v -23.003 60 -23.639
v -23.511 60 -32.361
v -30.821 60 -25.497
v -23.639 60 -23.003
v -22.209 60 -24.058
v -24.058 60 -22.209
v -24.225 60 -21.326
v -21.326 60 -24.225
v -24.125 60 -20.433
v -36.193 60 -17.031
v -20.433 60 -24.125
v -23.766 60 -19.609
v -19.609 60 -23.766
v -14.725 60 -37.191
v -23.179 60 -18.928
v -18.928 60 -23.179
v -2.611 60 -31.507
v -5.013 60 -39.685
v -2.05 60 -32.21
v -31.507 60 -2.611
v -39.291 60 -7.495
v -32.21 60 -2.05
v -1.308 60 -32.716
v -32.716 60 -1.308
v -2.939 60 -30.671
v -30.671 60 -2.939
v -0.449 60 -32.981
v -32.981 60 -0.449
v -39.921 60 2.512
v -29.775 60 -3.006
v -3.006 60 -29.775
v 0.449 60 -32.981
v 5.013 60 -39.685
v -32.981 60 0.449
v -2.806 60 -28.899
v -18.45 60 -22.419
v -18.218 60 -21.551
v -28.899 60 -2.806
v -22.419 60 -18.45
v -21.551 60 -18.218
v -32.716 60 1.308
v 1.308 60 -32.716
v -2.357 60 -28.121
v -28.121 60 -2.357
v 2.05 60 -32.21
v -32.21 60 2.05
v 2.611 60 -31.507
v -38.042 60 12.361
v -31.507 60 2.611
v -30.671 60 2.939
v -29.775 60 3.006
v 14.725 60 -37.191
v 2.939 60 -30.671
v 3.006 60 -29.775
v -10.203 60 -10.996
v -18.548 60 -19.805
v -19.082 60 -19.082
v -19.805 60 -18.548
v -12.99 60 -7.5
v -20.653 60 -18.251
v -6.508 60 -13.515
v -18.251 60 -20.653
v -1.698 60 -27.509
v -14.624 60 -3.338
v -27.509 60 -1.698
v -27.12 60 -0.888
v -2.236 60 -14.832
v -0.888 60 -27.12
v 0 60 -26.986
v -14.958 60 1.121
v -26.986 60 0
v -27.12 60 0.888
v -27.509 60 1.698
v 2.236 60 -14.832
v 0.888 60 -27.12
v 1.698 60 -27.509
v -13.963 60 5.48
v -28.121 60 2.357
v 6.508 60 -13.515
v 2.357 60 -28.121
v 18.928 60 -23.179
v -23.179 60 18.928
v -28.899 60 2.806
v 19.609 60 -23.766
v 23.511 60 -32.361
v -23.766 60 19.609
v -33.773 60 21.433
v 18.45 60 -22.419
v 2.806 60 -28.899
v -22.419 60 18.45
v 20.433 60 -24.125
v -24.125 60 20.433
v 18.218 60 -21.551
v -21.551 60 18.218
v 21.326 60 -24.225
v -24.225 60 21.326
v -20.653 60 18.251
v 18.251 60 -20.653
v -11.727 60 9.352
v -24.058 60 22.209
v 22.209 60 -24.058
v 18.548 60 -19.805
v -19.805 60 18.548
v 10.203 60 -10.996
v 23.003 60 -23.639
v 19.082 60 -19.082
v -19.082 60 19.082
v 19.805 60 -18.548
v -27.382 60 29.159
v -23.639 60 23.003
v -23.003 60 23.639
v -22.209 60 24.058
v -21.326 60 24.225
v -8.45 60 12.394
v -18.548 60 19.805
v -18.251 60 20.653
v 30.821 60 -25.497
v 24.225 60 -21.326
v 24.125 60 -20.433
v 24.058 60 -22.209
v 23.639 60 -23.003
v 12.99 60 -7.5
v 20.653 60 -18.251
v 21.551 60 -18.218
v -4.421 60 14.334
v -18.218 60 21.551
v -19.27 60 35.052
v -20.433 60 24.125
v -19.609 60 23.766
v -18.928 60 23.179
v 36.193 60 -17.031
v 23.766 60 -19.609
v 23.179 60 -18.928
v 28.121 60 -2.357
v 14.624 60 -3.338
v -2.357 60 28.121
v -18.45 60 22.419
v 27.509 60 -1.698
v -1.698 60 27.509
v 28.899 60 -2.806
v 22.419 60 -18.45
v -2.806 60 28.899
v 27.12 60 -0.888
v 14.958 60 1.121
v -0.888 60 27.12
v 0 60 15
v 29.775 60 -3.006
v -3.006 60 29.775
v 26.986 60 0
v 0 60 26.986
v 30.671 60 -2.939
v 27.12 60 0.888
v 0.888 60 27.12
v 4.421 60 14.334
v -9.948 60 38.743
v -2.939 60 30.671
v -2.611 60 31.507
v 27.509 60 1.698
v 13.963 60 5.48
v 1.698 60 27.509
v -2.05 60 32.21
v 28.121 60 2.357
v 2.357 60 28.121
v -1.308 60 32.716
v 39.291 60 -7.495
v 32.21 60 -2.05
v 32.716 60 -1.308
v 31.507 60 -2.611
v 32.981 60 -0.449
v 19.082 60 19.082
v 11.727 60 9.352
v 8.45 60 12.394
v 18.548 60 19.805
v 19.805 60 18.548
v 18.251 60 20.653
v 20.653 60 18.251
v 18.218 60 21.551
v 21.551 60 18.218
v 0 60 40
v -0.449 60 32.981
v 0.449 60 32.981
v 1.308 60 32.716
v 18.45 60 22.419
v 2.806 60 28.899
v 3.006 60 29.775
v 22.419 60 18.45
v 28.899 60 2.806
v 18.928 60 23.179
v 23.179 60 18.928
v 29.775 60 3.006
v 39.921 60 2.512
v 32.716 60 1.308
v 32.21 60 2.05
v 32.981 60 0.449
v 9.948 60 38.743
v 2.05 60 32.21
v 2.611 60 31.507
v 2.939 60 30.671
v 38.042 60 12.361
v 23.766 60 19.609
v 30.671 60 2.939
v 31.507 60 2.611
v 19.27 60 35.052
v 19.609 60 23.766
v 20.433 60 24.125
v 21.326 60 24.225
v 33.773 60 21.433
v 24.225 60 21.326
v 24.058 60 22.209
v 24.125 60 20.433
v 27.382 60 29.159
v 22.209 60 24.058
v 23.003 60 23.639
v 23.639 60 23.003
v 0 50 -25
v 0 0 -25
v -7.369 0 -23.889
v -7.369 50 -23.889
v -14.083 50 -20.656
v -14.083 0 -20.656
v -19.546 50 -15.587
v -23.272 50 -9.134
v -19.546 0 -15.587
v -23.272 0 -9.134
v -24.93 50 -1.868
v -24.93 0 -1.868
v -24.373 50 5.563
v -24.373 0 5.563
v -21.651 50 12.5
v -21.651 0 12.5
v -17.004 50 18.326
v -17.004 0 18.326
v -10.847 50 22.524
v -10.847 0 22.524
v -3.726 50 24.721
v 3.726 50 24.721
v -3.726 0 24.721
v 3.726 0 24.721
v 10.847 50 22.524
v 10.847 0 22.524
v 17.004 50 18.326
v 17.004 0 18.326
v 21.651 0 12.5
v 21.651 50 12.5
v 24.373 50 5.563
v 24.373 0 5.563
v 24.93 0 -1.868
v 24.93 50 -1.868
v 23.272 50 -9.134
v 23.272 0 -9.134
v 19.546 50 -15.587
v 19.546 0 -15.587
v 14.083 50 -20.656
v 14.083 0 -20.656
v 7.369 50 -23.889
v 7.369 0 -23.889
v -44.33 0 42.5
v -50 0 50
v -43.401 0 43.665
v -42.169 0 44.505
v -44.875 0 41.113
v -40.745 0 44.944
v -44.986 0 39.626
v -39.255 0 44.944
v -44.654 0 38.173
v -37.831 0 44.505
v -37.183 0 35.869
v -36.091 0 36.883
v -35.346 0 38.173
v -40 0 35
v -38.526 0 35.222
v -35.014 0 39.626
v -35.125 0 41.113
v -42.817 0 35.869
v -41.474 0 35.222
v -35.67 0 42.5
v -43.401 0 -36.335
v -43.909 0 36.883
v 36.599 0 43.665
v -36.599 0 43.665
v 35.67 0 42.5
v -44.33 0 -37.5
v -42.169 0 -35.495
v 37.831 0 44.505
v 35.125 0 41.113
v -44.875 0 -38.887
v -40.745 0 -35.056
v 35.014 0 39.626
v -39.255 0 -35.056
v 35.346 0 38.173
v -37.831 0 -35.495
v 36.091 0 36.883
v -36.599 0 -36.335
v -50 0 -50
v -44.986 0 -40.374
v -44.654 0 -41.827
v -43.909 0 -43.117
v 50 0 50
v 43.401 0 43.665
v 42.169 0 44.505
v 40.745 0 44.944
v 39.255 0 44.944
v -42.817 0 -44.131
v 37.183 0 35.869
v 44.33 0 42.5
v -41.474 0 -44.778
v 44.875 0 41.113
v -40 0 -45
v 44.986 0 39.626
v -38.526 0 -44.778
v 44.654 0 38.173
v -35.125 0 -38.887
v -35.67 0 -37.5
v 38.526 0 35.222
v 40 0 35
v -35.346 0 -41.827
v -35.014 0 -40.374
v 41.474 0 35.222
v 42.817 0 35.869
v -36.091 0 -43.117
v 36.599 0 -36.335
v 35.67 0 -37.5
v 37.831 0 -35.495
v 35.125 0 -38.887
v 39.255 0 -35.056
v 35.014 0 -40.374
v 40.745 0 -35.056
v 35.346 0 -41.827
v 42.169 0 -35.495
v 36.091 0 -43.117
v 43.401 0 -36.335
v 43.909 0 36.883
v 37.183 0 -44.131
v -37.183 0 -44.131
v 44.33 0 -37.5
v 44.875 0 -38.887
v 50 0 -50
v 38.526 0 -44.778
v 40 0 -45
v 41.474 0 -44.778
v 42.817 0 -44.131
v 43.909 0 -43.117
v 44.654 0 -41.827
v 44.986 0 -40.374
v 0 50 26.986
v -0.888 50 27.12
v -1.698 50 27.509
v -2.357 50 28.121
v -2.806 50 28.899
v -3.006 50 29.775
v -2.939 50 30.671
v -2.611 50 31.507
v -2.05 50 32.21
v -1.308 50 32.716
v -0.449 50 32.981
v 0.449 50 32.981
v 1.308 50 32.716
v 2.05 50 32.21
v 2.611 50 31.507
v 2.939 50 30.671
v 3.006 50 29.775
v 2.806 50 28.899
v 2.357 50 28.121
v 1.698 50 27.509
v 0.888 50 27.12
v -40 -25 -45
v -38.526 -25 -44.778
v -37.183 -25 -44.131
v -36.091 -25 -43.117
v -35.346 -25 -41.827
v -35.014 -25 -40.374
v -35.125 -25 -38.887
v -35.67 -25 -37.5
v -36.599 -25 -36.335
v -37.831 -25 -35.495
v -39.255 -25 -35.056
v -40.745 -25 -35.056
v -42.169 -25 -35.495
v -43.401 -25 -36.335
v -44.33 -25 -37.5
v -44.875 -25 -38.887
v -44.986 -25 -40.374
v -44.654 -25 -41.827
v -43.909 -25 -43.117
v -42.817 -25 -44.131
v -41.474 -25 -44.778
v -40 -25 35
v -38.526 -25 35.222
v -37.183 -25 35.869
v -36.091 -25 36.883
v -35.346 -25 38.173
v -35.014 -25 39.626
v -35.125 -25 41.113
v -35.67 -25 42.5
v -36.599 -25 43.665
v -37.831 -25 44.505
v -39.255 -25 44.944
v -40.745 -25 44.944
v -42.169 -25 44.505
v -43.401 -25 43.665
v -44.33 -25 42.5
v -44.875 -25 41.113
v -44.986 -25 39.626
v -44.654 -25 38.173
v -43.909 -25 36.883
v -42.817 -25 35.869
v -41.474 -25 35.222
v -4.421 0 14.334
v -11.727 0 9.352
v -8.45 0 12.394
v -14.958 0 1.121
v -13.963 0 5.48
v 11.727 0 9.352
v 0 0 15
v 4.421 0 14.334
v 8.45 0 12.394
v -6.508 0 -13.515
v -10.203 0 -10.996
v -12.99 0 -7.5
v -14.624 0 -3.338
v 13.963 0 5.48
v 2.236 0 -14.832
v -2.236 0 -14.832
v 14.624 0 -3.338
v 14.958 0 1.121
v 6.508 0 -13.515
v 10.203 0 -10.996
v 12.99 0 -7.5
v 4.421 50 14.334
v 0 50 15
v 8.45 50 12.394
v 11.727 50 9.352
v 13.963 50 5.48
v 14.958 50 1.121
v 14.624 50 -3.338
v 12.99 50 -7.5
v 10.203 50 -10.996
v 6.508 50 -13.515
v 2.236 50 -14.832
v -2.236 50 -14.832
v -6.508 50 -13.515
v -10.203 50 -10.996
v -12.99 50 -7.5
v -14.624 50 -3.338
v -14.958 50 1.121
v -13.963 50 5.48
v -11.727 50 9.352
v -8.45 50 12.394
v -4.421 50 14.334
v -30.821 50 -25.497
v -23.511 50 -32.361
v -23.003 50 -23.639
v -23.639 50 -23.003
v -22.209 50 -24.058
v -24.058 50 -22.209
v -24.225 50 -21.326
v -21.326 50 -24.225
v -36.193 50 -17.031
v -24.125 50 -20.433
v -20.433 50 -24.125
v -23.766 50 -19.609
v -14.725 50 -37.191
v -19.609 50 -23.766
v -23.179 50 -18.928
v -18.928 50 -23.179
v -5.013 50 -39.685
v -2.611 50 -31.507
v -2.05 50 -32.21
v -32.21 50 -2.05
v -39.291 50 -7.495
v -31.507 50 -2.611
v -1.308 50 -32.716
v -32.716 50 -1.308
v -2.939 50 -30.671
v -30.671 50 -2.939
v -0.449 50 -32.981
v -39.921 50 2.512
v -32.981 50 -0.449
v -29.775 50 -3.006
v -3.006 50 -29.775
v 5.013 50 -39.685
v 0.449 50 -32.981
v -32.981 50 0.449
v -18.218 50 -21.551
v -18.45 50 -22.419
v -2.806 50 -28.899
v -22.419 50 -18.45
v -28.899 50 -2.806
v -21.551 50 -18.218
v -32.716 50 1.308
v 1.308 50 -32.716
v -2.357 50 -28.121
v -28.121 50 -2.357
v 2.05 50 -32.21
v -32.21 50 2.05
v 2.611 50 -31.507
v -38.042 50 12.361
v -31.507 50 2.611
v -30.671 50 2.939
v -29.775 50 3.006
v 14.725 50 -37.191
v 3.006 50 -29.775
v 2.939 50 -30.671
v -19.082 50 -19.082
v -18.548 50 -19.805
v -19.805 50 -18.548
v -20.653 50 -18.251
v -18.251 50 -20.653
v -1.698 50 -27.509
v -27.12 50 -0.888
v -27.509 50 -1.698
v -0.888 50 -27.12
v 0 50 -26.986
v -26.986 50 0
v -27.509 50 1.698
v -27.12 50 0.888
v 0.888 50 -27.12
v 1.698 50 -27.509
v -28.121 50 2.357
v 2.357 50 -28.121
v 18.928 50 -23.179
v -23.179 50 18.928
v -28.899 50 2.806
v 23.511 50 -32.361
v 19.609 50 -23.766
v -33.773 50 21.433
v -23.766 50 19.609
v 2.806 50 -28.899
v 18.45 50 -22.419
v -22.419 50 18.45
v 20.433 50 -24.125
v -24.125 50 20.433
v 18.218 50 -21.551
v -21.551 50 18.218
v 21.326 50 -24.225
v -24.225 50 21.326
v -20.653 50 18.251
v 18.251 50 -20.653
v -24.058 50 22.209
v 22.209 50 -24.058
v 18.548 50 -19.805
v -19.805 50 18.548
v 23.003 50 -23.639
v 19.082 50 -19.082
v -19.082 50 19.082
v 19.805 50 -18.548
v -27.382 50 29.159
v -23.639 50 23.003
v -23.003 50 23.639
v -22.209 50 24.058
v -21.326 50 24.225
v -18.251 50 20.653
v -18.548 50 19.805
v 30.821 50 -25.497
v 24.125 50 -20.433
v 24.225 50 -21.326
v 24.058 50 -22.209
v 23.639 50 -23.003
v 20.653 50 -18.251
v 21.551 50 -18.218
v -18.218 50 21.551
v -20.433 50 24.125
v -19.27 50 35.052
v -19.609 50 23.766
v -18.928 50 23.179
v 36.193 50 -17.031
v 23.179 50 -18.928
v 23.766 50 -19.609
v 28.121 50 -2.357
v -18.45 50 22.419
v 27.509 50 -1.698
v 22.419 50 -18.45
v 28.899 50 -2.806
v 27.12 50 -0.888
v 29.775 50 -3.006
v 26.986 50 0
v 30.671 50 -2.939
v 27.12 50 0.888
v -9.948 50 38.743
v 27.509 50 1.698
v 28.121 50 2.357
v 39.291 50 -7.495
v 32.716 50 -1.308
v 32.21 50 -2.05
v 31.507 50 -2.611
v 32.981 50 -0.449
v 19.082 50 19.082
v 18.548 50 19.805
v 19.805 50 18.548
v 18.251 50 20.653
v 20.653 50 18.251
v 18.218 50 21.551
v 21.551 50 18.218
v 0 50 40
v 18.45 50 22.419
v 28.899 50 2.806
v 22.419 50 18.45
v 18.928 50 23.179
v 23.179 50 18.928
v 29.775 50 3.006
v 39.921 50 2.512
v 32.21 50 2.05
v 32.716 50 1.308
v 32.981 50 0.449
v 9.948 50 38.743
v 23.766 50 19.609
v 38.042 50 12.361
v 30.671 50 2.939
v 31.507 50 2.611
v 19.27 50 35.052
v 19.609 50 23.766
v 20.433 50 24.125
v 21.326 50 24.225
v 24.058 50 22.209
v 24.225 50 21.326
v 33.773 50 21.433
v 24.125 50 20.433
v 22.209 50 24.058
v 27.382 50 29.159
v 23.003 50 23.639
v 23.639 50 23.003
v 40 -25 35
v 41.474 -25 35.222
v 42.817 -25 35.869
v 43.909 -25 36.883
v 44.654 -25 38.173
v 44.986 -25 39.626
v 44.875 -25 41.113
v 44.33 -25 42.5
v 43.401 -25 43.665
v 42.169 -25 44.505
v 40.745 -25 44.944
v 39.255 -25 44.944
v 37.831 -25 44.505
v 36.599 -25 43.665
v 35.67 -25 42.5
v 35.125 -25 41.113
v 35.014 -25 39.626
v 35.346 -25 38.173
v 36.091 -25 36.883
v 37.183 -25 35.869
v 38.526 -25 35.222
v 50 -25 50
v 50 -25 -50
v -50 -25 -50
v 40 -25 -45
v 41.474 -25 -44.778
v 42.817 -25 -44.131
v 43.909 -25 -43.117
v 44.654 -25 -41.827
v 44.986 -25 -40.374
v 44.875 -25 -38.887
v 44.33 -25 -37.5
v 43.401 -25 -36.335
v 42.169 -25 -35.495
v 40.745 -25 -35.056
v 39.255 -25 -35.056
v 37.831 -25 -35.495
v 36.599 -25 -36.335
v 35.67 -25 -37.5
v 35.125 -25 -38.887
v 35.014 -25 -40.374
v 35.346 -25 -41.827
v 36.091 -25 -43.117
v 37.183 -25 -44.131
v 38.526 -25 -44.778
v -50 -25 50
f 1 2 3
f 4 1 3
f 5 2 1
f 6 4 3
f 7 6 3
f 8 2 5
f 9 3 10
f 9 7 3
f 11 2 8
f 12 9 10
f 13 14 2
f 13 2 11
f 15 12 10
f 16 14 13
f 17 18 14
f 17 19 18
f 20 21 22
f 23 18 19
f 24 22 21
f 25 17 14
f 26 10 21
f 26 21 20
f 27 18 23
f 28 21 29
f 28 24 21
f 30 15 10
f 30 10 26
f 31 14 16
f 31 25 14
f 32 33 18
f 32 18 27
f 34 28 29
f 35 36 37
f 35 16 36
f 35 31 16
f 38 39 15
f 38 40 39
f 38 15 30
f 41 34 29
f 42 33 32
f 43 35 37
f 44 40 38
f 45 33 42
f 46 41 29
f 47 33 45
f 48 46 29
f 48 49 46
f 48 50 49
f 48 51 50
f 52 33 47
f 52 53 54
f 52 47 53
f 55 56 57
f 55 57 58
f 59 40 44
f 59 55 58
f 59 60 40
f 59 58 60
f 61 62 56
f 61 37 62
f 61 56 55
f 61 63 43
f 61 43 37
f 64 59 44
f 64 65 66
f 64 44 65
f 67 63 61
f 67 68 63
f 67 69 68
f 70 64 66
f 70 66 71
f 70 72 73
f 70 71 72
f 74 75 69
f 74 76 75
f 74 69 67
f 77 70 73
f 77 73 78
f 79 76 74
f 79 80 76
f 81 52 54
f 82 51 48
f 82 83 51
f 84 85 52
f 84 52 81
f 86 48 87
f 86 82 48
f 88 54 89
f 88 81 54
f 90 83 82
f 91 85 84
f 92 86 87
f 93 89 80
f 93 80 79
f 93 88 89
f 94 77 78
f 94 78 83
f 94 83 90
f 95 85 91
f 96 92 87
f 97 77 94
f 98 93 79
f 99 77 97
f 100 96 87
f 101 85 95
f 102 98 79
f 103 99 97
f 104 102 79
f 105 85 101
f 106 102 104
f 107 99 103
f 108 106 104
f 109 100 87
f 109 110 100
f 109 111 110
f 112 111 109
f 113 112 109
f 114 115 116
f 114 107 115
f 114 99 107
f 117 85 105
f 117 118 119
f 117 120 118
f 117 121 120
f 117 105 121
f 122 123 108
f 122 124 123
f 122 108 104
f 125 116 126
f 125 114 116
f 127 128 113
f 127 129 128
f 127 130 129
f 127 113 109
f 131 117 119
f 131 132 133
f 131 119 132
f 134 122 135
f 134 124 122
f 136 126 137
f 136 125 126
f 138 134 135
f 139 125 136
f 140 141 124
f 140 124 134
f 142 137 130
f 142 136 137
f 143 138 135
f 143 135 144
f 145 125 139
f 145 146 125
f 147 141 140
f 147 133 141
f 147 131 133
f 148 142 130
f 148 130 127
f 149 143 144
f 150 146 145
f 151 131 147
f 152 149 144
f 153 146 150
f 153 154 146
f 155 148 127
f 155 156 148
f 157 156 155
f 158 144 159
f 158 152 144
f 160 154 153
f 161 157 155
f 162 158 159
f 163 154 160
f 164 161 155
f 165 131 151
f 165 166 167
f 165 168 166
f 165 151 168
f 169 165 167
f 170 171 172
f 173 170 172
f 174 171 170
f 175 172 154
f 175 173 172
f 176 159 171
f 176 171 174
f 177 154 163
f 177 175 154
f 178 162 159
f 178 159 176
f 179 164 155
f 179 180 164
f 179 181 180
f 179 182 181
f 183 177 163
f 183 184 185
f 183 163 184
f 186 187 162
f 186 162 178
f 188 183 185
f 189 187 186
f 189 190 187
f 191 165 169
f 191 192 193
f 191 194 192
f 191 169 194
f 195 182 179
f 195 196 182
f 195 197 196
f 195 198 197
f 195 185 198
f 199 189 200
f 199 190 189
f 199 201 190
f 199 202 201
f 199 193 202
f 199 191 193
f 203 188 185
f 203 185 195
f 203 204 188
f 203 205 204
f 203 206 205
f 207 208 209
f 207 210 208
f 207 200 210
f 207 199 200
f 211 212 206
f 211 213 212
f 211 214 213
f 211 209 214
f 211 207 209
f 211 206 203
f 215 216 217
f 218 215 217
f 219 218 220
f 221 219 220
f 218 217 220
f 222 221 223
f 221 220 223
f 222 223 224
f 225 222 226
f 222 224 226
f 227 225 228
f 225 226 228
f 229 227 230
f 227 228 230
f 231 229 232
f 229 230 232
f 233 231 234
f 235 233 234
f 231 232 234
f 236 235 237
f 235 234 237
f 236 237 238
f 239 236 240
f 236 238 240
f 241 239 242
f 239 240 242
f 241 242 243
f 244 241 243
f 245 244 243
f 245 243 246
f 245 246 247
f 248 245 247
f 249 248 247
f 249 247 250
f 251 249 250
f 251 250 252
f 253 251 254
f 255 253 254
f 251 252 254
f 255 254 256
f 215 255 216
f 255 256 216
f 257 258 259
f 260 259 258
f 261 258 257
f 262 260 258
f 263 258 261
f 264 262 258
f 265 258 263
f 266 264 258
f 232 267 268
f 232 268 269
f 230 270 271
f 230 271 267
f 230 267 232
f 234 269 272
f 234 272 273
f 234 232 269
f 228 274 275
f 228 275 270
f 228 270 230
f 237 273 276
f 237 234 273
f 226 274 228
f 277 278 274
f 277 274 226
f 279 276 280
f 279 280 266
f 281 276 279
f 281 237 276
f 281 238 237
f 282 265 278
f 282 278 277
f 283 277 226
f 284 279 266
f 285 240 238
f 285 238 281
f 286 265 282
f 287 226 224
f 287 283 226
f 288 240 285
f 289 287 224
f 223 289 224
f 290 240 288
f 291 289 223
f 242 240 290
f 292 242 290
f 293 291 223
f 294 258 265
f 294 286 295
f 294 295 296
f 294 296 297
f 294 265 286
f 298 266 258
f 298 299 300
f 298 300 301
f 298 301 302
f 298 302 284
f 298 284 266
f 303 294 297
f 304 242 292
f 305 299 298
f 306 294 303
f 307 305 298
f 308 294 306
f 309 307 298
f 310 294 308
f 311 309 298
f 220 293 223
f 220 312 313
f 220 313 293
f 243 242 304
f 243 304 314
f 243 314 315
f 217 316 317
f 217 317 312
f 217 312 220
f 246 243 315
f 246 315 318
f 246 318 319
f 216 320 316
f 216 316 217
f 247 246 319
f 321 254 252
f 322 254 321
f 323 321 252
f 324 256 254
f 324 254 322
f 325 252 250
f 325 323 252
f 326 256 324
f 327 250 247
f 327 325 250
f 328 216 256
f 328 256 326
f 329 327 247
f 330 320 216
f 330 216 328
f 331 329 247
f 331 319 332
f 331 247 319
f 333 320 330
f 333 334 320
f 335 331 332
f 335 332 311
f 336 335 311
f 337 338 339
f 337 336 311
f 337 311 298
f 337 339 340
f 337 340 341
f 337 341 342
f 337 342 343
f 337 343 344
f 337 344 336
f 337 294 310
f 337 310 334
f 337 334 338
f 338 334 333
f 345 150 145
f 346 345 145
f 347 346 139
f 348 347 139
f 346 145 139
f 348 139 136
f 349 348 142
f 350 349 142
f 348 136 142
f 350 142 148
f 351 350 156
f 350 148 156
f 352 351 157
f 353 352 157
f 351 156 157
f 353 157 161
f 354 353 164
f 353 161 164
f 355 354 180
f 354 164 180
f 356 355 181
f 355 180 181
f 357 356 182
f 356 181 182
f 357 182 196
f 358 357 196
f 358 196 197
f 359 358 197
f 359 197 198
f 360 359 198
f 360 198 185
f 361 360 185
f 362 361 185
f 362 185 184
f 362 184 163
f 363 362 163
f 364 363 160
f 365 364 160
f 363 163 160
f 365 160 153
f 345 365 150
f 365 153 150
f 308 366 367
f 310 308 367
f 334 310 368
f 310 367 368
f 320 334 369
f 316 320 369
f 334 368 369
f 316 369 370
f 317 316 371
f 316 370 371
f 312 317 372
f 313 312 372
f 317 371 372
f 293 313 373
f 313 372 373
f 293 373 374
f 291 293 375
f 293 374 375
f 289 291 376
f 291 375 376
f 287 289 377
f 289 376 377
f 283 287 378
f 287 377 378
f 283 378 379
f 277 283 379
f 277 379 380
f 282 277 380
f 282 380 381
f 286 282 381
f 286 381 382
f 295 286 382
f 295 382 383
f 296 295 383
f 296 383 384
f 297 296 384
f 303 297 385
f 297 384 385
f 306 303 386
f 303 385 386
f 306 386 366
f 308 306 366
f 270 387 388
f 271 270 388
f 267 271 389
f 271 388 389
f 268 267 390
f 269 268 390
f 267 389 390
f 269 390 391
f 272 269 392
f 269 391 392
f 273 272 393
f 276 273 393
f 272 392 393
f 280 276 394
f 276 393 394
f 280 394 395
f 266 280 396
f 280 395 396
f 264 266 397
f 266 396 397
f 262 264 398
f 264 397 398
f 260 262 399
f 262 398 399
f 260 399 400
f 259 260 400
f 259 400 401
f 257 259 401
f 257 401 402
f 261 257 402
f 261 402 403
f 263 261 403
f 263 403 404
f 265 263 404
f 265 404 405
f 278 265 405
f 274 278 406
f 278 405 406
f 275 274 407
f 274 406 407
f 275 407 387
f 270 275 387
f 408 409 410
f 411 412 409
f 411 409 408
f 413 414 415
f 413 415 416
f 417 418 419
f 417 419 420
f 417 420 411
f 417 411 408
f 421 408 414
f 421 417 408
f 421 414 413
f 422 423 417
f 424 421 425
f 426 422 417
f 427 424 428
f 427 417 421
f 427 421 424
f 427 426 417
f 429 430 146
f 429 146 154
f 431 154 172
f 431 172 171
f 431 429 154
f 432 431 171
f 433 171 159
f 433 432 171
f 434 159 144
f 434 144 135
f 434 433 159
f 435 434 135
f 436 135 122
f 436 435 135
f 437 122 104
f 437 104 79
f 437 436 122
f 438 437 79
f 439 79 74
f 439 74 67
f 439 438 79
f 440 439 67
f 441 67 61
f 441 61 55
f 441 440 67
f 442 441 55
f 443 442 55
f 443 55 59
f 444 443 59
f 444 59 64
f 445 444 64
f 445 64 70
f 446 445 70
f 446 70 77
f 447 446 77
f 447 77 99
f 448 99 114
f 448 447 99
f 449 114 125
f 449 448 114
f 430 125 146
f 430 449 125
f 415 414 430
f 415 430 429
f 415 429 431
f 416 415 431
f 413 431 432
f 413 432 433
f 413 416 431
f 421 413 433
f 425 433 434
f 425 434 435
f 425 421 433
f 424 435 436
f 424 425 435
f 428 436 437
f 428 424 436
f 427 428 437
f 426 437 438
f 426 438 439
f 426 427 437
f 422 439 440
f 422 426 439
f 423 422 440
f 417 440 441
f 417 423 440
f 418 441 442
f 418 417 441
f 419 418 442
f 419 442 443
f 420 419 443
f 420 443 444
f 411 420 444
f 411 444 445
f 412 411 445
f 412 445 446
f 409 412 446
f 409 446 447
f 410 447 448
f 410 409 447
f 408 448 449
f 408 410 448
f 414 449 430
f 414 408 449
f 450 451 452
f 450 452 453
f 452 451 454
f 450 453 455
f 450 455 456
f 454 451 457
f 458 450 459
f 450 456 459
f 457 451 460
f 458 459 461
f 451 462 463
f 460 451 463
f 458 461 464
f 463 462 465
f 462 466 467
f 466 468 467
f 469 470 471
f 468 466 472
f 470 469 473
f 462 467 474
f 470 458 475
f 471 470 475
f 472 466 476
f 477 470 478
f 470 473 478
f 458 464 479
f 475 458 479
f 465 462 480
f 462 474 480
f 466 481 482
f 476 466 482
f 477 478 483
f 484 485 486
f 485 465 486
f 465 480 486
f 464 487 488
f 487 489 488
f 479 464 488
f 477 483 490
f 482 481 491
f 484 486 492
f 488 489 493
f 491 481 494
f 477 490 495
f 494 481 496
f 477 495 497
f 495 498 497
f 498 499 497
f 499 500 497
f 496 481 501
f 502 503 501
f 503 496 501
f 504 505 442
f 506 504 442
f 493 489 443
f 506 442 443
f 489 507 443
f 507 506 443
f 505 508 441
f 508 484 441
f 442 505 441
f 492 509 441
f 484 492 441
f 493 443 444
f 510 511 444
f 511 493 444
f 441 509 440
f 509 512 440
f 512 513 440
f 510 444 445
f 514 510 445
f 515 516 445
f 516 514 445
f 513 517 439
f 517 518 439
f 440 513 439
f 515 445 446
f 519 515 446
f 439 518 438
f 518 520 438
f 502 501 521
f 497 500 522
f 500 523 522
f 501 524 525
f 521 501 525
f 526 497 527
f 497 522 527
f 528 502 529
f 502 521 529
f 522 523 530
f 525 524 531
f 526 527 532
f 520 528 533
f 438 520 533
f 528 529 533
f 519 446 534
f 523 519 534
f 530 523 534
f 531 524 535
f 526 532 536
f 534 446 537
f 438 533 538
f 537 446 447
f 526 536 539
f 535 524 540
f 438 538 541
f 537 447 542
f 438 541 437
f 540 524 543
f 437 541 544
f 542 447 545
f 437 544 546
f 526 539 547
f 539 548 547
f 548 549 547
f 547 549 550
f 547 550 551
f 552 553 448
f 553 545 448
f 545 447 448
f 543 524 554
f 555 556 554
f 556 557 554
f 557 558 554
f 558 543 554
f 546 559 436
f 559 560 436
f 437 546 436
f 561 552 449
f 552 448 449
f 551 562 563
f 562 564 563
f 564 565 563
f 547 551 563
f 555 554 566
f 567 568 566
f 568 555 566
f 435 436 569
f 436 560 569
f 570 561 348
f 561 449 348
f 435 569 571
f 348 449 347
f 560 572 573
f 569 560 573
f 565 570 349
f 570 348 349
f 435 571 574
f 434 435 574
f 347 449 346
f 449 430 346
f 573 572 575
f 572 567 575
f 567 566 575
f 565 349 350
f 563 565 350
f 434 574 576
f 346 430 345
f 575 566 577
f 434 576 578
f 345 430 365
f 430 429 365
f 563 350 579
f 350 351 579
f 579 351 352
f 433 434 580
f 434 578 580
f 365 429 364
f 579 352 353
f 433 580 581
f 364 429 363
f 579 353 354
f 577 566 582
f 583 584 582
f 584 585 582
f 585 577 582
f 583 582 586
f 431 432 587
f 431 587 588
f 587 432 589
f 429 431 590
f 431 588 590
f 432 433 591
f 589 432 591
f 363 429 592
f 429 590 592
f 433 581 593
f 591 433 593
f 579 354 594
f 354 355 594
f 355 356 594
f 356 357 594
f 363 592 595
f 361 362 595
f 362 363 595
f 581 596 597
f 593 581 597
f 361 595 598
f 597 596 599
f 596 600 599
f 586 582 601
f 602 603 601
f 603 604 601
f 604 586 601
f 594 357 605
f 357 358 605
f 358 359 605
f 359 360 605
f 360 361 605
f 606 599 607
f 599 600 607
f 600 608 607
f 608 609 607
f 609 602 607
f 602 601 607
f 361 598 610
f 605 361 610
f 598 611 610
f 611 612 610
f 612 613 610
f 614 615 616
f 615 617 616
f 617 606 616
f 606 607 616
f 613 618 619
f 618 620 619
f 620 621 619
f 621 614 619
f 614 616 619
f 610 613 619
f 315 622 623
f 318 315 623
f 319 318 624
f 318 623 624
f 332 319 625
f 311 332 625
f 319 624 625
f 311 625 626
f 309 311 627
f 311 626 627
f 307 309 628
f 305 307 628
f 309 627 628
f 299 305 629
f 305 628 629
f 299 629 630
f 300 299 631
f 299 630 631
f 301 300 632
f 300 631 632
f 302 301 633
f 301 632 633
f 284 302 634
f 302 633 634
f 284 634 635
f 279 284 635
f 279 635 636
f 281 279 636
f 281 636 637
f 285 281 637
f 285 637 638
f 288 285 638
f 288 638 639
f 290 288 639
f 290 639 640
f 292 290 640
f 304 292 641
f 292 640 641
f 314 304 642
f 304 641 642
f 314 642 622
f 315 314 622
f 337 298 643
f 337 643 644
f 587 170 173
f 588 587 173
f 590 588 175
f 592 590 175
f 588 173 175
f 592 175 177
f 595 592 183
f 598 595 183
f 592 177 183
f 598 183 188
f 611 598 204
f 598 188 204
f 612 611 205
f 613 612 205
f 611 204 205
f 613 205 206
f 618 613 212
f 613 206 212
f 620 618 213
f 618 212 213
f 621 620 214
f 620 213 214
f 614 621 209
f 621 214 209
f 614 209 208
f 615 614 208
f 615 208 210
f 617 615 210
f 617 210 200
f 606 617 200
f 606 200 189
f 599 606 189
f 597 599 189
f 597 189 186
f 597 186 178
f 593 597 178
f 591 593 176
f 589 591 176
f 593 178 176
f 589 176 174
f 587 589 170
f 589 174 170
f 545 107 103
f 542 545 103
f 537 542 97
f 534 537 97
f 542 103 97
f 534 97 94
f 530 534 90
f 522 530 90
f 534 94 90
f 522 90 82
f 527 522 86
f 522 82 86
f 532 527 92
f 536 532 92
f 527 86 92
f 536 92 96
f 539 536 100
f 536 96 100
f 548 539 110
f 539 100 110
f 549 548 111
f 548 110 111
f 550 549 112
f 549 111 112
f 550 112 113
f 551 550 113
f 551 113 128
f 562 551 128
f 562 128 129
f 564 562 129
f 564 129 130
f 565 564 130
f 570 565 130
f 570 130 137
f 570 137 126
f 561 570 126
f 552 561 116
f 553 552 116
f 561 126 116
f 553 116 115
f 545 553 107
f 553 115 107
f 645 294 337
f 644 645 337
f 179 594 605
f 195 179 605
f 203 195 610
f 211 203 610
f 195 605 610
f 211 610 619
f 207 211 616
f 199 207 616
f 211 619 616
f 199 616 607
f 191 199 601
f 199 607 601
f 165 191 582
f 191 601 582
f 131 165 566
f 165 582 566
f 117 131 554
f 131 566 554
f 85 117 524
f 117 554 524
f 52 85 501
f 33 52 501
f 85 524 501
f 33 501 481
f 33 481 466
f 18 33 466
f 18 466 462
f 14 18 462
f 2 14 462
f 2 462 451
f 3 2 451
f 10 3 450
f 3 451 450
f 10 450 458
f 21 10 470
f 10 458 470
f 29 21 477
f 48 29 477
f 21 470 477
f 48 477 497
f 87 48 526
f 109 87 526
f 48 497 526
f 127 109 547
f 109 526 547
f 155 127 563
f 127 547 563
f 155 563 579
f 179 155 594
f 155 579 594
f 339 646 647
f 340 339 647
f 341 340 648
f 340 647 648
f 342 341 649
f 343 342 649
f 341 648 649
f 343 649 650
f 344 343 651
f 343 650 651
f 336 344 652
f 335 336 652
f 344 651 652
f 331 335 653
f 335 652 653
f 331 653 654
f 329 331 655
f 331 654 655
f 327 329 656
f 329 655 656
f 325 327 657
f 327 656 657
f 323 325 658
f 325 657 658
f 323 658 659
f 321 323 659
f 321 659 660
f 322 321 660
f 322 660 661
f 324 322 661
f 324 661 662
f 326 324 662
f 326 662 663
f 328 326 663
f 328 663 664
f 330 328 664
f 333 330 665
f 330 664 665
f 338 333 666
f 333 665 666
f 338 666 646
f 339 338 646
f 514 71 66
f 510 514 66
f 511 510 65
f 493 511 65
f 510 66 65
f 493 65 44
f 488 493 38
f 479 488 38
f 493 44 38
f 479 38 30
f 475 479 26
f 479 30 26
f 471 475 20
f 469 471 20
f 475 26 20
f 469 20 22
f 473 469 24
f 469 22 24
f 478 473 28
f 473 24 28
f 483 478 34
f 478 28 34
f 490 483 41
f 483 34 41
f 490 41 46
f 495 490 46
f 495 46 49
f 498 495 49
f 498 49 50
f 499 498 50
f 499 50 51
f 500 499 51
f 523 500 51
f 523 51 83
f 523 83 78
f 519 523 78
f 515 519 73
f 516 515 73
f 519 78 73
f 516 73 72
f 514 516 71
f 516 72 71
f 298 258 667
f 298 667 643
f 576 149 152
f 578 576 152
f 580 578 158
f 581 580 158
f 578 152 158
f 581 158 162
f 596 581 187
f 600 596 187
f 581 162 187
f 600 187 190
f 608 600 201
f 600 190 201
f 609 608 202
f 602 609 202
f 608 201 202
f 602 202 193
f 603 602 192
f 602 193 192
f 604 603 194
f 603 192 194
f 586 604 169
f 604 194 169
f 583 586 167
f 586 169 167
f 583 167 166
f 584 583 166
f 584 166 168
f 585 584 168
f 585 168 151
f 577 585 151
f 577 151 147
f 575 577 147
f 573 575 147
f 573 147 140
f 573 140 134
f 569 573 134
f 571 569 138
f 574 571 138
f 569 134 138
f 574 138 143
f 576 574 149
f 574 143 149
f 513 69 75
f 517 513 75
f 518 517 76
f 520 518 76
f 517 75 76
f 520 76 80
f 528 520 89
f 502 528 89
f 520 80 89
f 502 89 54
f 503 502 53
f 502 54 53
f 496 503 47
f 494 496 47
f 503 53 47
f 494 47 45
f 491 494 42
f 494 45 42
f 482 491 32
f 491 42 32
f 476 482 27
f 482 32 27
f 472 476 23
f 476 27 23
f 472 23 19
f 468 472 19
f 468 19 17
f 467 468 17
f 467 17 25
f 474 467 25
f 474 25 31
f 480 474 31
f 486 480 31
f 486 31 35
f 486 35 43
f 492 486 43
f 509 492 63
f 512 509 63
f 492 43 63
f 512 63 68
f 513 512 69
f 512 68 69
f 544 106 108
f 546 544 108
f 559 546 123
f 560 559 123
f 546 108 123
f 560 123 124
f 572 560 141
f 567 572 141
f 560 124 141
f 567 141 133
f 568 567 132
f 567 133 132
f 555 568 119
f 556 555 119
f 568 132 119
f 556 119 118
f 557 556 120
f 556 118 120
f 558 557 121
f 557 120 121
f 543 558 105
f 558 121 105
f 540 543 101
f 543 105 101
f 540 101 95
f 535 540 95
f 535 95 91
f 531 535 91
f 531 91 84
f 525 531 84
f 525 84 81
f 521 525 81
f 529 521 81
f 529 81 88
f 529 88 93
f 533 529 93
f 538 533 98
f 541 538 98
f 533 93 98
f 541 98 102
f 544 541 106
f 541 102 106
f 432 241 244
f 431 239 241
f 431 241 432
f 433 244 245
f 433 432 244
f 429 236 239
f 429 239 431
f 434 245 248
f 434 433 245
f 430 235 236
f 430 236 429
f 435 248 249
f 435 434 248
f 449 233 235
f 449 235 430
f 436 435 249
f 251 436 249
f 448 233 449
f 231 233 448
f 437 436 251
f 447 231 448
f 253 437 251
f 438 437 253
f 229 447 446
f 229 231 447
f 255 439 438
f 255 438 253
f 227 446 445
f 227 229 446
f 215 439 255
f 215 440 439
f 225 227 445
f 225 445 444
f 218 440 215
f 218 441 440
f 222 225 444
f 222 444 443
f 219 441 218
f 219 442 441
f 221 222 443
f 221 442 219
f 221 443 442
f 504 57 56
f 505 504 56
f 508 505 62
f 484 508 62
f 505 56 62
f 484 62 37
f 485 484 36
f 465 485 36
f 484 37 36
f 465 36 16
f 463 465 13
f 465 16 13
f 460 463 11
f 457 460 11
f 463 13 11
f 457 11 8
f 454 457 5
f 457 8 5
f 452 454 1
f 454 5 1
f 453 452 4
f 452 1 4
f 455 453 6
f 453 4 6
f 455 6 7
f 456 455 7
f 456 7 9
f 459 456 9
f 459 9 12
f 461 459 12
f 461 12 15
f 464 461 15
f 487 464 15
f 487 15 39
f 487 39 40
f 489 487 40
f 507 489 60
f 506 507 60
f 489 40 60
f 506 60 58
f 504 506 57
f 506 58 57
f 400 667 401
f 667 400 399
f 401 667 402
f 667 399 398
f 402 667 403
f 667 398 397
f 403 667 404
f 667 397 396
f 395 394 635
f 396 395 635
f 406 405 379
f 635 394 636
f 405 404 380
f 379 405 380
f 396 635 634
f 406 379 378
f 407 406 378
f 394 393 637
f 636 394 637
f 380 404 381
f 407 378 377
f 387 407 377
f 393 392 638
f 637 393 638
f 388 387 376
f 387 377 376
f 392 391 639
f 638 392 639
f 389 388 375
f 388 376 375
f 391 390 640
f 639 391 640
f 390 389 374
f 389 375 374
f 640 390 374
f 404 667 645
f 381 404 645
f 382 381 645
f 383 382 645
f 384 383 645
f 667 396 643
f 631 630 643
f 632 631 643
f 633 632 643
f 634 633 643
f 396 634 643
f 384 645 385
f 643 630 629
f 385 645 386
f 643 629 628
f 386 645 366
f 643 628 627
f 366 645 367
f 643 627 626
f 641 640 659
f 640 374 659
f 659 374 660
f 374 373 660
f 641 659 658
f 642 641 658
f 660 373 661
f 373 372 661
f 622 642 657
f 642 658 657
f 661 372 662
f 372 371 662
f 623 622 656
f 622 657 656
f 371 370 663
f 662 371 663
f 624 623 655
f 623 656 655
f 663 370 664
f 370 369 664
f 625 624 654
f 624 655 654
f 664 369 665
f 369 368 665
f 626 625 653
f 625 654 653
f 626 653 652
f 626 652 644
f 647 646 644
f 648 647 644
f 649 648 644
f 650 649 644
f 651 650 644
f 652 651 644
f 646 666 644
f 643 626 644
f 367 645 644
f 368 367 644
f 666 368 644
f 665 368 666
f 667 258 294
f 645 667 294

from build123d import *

# Parameters (mm, degrees)
SKETCH1_W            = 100
SKETCH1_H            = 100
BOSS_EXTRUDE1_DEPTH  = 25
SKETCH2_R            = 25
SKETCH2_R_2          = 15
BOSS_EXTRUDE2_DEPTH  = 50
SKETCH3_R            = 40
SKETCH3_R_2          = 15
BOSS_EXTRUDE3_DEPTH  = 10
SKETCH4_R            = 3.014352333
CUT_EXTRUDE1_DEPTH   = 10
CIRPATTERN1_COUNT    = 8
SKETCH5_R            = 5
CUT_EXTRUDE2_DEPTH   = 25
LPATTERN1_COUNT      = 2
LPATTERN1_PITCH      = 80
LPATTERN1_COUNT_DIR2 = 2
LPATTERN1_PITCH_DIR2 = 80


with BuildPart() as part:
    # Sketch1 → Boss-Extrude1 (new body)
    with BuildSketch(Plane(origin=(0, 0, 0), x_dir=(1, 0, 0), z_dir=(0, 1, 0))):
        Rectangle(SKETCH1_W, SKETCH1_H)
    extrude(amount=-BOSS_EXTRUDE1_DEPTH)

    # Sketch2 → Boss-Extrude2 (add)
    with BuildSketch(Plane(origin=(0, 0, 0), x_dir=(1, 0, 0), z_dir=(0, 1, 0))):
        with Locations(Location((0, 0, 0), (0, 0, 90))):
            Circle(SKETCH2_R)
        with Locations(Location((0, 0, 0), (0, 0, 270))):
            Circle(SKETCH2_R_2, mode=Mode.SUBTRACT)
    extrude(amount=BOSS_EXTRUDE2_DEPTH)

    # Sketch5 → Cut-Extrude2 (cut)
    with BuildSketch(Plane.XZ.offset(25)):
        with Locations(Location((-40, 40, 0), (0, 0, 270))):
            Circle(SKETCH5_R)
    cut_extrude2 = extrude(amount=-CUT_EXTRUDE2_DEPTH, mode=Mode.SUBTRACT)

    # LPattern1: Cut-Extrude2 2 × 2
    with Locations(*[(j * LPATTERN1_PITCH_DIR2, 0, -i * LPATTERN1_PITCH) for i in range(LPATTERN1_COUNT) for j in range(LPATTERN1_COUNT_DIR2) if (i, j) != (0, 0)]):
        add(cut_extrude2, mode=Mode.SUBTRACT)


with BuildPart() as body_2:
    # Sketch3 → Boss-Extrude3 (new body)
    with BuildSketch(Plane(origin=(0, 50, 0), x_dir=(1, 0, 0), z_dir=(0, 1, 0))):
        with Locations(Location((0, 0, 0), (0, 0, 270))):
            Circle(SKETCH3_R)
        with Locations(Location((0, 0, 0), (0, 0, 270))):
            Circle(SKETCH3_R_2, mode=Mode.SUBTRACT)
    extrude(amount=BOSS_EXTRUDE3_DEPTH)

    # Sketch4 → Cut-Extrude1 (cut)
    with BuildSketch(Plane(origin=(0, 60, 0), x_dir=(1, 0, 0), z_dir=(0, 1, 0))):
        with Locations(Location((0, 30, 0), (0, 0, 270))):
            Circle(SKETCH4_R)
    cut_extrude1 = extrude(amount=-CUT_EXTRUDE1_DEPTH, mode=Mode.SUBTRACT)

    # CirPattern1: Cut-Extrude1 ×8 about axis
    cirpattern1_axis = Axis((0, 0, 0), (0, 1, 0))
    for i in range(1, CIRPATTERN1_COUNT):
        add(cut_extrude1.rotate(cirpattern1_axis, i * 360 / CIRPATTERN1_COUNT), mode=Mode.SUBTRACT)


solid = Compound([part.part, body_2.part])
